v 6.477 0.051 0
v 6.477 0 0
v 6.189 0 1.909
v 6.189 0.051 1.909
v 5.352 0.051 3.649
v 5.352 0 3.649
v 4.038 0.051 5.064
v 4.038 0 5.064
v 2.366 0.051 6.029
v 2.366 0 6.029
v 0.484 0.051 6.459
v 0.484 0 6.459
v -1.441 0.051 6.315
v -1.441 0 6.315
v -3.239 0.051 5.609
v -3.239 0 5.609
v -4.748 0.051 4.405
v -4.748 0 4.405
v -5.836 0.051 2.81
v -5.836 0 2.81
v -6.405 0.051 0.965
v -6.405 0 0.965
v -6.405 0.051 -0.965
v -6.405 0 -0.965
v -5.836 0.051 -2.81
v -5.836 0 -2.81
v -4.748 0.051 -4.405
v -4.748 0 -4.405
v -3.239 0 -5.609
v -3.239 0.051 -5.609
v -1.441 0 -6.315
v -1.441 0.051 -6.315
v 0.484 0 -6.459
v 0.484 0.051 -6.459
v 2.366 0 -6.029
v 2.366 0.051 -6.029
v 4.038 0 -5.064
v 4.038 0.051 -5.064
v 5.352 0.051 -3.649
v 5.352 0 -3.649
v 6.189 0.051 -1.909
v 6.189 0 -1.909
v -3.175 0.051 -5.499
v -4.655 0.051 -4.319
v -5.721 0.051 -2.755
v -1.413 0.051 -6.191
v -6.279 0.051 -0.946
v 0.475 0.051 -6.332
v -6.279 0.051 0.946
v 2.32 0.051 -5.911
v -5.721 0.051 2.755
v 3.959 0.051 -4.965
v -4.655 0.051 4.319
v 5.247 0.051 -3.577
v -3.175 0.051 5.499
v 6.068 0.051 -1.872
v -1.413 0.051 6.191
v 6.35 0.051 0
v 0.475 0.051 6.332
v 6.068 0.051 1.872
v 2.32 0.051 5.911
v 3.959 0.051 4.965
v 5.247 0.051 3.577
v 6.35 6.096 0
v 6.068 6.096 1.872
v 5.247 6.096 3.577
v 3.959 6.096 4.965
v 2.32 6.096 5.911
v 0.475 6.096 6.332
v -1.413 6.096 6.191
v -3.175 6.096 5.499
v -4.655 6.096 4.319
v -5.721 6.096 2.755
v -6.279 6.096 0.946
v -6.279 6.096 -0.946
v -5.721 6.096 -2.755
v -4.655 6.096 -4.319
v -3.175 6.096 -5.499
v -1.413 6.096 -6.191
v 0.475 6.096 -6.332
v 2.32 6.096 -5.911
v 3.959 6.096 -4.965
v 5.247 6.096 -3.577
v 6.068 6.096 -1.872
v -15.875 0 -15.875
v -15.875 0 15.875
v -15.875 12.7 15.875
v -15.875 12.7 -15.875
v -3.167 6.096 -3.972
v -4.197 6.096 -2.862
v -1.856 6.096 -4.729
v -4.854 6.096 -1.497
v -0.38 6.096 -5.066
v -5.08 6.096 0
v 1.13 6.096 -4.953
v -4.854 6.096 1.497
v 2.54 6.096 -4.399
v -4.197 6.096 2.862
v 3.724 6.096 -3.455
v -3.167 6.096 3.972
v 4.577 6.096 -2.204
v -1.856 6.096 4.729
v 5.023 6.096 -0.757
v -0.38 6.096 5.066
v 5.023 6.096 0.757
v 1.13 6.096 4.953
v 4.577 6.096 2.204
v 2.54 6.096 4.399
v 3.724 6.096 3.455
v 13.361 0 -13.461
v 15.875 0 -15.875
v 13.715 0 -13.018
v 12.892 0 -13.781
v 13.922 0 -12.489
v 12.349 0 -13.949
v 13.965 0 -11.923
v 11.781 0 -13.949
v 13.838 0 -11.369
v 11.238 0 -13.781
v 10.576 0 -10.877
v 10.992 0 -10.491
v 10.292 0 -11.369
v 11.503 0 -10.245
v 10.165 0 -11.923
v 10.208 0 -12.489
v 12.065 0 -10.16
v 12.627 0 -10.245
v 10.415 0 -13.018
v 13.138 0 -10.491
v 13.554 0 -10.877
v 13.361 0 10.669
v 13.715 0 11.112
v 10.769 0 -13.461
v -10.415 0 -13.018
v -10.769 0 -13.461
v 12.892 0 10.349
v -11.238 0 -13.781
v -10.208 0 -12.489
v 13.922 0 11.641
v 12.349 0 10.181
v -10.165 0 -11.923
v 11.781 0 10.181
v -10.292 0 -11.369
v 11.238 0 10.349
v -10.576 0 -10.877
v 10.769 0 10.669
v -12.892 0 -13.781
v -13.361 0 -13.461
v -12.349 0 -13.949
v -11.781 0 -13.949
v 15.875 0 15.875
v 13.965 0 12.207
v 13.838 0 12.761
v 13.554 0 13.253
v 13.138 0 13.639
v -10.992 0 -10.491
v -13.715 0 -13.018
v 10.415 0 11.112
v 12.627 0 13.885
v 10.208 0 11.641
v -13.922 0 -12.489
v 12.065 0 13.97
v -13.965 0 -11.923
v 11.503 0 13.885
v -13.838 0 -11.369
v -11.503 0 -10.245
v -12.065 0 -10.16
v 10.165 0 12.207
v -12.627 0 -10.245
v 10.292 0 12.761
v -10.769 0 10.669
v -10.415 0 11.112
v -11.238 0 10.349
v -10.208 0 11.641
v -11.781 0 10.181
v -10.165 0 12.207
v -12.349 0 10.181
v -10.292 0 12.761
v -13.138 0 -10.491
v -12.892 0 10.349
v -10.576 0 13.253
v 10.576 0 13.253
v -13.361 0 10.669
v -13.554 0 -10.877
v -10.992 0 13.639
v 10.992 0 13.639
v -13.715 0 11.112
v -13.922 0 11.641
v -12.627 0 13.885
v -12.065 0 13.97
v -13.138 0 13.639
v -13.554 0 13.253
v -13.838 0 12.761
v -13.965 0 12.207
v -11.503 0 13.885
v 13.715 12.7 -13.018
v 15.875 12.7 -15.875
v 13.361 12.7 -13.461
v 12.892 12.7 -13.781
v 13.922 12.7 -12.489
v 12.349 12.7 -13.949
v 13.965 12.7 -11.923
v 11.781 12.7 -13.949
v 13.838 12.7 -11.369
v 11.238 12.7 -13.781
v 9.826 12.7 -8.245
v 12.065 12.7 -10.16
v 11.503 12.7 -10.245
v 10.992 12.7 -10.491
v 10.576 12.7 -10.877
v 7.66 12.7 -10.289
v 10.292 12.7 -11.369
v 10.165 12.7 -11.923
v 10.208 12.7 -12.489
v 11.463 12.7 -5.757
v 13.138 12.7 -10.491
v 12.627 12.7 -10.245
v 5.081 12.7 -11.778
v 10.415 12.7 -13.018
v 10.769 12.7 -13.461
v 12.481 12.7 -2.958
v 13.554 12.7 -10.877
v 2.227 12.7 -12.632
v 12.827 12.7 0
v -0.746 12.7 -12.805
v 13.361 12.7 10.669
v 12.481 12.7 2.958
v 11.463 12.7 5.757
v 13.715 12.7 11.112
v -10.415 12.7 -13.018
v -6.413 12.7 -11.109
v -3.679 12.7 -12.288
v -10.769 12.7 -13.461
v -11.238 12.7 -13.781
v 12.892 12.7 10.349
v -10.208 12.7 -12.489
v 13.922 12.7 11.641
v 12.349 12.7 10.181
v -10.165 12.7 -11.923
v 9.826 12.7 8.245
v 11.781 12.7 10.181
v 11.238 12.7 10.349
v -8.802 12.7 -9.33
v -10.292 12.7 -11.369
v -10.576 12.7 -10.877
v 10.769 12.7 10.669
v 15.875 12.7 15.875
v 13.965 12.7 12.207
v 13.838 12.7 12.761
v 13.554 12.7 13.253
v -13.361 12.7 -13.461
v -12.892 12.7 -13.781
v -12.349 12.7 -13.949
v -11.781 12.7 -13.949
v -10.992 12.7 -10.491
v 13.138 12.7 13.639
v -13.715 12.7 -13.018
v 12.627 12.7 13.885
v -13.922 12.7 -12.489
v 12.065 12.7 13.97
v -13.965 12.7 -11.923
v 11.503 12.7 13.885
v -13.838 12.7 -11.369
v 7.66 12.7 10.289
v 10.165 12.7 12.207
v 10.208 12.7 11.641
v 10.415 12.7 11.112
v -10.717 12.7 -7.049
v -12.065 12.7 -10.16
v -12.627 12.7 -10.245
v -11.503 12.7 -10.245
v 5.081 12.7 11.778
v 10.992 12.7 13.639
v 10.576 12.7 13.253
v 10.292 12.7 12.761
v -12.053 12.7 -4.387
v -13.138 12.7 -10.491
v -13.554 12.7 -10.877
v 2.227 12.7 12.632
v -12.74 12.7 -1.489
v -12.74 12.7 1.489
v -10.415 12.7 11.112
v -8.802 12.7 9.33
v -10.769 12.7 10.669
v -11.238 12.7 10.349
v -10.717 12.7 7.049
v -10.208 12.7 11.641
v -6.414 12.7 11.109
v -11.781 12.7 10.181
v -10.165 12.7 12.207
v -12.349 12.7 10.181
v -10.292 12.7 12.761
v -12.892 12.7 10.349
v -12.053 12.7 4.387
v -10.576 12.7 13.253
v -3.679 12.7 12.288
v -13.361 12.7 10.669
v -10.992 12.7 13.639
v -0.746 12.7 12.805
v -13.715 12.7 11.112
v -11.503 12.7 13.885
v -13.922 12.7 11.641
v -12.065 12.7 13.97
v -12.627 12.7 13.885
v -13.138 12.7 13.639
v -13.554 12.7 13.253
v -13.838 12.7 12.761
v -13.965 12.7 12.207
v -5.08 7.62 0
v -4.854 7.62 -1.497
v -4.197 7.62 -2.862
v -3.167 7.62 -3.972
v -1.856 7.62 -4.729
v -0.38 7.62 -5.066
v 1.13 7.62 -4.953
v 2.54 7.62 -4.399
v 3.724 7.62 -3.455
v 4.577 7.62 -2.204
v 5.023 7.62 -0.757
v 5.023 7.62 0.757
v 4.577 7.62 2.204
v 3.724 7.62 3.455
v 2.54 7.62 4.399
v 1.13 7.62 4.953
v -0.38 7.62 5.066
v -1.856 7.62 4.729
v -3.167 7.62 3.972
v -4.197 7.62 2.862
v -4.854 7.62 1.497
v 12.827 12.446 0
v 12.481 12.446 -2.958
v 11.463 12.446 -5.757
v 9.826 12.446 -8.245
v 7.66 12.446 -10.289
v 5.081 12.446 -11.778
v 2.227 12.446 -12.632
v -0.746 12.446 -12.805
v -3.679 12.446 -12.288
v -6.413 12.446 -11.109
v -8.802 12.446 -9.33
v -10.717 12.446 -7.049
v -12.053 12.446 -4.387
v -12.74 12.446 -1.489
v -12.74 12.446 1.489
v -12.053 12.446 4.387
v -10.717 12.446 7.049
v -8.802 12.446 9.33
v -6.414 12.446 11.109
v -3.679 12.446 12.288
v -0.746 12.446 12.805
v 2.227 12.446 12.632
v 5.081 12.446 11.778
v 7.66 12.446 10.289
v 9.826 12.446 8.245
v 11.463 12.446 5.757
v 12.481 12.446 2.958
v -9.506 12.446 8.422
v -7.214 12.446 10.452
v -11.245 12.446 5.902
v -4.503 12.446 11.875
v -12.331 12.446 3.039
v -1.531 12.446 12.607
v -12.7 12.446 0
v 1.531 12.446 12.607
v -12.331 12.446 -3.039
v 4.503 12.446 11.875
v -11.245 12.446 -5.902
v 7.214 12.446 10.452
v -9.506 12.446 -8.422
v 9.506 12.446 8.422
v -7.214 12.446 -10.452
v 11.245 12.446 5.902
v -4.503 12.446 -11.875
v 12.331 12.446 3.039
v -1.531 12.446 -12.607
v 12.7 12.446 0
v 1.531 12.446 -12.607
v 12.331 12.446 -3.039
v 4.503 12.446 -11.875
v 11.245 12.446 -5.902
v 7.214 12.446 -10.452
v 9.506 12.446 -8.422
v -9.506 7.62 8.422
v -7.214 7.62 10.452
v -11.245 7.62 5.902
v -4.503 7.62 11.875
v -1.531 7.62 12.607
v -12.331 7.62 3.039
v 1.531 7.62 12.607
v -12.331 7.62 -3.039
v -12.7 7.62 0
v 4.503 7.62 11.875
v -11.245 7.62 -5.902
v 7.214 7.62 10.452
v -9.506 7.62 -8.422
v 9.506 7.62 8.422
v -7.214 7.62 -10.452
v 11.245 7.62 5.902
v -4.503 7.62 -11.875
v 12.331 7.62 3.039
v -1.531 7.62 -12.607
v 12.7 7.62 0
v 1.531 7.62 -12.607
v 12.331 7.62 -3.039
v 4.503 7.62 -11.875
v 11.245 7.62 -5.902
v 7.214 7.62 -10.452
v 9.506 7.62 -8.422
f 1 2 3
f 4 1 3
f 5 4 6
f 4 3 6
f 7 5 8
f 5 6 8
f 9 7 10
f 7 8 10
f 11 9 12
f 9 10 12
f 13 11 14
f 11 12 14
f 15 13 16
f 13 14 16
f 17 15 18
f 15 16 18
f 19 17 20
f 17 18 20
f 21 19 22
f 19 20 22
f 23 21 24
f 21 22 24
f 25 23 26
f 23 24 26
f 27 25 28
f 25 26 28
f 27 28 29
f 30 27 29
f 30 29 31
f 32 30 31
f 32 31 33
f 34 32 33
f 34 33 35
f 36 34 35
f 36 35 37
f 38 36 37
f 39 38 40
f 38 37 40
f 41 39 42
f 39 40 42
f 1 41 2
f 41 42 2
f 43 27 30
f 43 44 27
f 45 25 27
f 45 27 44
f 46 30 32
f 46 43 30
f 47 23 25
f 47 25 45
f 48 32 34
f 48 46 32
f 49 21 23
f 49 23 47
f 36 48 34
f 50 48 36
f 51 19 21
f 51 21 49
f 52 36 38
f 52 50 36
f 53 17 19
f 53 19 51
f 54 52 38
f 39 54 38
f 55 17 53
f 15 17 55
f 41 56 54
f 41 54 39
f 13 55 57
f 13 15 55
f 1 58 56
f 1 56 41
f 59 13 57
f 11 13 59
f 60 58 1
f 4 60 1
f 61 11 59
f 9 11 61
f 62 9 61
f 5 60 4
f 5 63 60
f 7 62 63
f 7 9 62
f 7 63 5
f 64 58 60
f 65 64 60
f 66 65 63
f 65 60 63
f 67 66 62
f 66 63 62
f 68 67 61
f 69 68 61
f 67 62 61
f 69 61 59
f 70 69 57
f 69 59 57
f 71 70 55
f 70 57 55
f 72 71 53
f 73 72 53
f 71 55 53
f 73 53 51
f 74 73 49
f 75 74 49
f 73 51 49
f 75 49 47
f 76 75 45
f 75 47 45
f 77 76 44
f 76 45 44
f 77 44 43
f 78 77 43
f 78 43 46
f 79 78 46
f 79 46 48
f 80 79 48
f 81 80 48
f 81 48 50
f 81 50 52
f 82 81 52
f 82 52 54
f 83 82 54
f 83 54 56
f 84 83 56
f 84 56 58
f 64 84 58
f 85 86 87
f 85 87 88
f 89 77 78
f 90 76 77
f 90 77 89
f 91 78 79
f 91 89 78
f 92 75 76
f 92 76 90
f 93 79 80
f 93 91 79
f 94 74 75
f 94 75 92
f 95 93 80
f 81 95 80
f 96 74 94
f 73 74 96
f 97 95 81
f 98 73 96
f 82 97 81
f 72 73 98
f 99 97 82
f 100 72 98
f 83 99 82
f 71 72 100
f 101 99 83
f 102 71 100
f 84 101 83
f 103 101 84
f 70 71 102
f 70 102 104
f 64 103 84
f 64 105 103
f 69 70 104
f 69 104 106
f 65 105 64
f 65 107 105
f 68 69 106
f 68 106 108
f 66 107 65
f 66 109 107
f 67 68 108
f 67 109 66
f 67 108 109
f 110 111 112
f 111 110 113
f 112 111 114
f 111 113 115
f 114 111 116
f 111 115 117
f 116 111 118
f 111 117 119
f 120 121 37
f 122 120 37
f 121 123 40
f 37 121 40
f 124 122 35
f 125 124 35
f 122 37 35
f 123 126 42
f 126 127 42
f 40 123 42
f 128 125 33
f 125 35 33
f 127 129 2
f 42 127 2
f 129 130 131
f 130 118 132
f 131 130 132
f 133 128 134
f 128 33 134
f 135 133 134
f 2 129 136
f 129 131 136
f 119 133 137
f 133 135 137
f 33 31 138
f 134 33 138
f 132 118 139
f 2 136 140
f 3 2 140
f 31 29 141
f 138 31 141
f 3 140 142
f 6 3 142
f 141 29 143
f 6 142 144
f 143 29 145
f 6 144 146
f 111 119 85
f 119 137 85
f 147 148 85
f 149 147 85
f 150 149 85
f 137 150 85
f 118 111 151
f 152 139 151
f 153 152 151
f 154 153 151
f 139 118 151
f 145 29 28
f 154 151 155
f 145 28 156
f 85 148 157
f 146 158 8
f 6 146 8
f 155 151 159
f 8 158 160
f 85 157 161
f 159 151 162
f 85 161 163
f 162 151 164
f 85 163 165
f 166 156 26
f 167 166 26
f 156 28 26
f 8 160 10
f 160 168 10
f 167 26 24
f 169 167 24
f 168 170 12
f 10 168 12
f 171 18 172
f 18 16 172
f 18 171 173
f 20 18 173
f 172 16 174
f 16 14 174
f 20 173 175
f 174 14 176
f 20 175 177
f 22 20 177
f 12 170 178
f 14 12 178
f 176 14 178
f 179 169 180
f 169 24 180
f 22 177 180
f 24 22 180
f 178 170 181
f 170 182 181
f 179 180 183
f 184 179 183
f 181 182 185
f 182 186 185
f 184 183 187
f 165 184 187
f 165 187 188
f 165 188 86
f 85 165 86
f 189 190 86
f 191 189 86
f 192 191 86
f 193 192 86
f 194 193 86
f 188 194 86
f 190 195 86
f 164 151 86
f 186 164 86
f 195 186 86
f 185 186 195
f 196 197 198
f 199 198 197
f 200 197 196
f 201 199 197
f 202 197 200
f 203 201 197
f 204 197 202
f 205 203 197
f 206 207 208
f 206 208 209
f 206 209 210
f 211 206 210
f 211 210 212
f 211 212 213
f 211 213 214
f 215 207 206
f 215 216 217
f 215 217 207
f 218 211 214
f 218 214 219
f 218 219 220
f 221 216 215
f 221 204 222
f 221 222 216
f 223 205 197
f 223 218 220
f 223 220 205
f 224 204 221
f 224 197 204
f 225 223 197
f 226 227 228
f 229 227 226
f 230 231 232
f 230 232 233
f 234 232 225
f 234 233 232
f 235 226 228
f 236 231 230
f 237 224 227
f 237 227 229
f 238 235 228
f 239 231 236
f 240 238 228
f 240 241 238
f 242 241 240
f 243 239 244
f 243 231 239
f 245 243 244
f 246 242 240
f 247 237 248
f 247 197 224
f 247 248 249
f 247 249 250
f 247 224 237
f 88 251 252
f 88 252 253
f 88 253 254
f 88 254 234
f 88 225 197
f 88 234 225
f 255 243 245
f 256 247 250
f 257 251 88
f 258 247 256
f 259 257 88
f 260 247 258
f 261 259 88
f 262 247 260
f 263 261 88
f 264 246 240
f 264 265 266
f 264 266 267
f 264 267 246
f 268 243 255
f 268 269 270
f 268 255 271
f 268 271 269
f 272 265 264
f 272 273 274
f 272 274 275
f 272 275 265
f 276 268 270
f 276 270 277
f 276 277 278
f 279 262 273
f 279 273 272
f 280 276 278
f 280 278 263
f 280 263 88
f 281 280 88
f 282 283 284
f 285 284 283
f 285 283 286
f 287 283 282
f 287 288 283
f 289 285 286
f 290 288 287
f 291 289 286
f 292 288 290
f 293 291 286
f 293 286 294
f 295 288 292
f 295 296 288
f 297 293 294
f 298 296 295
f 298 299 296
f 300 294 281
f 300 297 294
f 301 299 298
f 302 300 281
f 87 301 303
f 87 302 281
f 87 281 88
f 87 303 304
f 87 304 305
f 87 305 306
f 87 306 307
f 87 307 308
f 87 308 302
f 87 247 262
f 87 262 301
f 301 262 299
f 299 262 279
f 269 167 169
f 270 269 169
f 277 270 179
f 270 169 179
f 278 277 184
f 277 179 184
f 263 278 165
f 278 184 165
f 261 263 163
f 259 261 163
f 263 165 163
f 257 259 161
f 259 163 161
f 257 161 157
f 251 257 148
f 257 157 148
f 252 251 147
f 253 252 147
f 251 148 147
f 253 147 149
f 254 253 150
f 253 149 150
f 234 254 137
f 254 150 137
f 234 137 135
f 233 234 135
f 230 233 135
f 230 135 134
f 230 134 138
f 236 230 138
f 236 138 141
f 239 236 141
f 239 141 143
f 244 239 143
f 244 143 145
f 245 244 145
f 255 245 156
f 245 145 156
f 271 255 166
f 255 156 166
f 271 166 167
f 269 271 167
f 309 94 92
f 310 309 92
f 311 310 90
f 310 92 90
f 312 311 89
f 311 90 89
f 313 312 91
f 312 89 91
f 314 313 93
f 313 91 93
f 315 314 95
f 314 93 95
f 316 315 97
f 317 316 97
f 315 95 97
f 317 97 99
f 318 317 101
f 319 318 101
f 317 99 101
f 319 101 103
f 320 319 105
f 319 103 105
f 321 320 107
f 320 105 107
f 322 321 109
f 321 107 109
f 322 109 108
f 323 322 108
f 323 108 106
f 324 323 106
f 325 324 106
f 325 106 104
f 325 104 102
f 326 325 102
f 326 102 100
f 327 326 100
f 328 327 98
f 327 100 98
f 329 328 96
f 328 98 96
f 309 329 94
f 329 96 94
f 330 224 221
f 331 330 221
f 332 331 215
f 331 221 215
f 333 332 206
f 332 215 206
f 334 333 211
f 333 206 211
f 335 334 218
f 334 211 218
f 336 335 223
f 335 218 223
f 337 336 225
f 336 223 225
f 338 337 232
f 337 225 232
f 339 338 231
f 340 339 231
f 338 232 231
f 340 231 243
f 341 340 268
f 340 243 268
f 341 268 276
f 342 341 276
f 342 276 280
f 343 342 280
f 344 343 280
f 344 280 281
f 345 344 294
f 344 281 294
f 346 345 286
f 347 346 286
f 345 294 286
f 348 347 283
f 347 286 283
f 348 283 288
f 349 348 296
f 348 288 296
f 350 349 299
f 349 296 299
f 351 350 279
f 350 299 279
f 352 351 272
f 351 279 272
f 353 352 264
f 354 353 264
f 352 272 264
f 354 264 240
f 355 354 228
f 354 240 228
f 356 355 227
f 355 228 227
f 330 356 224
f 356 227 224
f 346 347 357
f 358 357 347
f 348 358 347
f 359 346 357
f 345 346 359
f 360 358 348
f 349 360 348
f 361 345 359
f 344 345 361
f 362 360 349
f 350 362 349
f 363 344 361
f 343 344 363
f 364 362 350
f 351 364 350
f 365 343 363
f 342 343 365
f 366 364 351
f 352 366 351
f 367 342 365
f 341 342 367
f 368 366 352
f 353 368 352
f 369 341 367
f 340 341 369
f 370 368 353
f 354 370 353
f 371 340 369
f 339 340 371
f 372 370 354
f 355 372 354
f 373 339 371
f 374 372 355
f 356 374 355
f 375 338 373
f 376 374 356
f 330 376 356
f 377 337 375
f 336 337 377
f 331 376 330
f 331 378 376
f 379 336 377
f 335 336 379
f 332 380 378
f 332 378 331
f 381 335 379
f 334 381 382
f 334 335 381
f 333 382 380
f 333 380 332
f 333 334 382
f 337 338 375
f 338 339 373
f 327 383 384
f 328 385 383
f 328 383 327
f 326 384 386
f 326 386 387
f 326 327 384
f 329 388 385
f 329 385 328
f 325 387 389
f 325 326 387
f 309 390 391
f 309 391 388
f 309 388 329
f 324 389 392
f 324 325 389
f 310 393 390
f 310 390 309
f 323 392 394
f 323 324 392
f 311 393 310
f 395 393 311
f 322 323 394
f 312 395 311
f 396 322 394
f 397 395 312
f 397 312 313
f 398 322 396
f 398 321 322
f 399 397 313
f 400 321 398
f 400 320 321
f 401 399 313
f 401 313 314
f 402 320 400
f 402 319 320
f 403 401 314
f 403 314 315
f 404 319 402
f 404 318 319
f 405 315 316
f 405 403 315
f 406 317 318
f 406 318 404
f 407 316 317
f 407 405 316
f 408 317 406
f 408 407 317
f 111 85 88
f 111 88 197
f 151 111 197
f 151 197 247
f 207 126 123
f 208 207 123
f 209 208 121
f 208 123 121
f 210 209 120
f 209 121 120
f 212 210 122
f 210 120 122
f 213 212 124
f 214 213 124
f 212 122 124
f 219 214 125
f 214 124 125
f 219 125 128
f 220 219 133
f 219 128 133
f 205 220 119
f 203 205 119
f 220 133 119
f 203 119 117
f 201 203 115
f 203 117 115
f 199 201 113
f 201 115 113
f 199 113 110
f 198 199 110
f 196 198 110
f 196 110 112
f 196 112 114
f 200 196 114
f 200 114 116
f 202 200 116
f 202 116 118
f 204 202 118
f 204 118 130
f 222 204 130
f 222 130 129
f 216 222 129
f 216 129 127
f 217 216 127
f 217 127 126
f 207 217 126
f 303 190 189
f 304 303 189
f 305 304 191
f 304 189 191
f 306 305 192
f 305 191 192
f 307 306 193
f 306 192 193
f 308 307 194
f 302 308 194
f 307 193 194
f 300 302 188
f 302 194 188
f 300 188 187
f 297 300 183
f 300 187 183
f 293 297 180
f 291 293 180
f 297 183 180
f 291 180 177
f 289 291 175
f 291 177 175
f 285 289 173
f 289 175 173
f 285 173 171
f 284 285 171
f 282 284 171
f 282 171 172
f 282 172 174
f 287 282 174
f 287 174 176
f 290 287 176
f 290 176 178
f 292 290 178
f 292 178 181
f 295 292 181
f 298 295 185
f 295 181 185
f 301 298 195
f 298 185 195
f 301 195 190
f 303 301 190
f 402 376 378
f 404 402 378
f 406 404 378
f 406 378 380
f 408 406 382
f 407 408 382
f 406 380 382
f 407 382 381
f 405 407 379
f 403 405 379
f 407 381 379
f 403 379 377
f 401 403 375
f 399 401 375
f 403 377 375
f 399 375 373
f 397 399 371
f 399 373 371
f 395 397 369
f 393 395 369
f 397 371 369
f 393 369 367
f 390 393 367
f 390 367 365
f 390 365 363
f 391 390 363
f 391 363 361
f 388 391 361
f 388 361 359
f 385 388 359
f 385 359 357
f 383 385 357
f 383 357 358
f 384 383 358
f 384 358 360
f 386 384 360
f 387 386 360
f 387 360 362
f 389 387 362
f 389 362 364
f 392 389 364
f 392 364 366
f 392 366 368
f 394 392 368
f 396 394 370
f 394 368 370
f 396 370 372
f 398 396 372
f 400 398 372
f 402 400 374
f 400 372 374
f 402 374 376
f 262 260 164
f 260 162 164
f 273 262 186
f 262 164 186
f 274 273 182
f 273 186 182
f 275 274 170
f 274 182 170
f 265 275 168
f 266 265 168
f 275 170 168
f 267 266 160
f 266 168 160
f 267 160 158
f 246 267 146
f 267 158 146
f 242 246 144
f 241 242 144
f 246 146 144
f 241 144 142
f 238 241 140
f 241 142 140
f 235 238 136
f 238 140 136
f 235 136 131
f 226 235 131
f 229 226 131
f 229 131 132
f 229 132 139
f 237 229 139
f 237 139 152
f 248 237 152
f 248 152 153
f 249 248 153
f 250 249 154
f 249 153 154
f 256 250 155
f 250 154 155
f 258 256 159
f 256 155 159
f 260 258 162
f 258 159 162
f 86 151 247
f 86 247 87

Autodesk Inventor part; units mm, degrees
ref_plane "YZ Plane" through (0, 0, 0) normal (1, 0, 0) x (0, 1, 0)
ref_plane "XZ Plane" through (0, 0, 0) normal (0, 1, 0) x (-1, 0, 0)
ref_plane "XY Plane" through (0, 0, 0) normal (0, 0, 1) x (1, 0, 0)
sketch "Sketch1" plane through (0, 0, 0) normal (0, 1, 0) x (-1, 0, 0)
  circle A0 centre (0, 0) radius 5.08
  line L0 (-15.875, 15.875) -> (15.875, 15.875)
  line L1 (15.875, 15.875) -> (15.875, -15.875)
  line L2 (15.875, -15.875) -> (-15.875, -15.875)
  line L3 (-15.875, -15.875) -> (-15.875, 15.875)
  line L4 (-15.875, 15.875) -> (15.875, -15.875) construction
  line L5 (15.875, 15.875) -> (-15.875, -15.875) construction
  dimension "d0" = 10.16
  dimension "d1" = 31.75
  dimension "d2" = 31.75
extrude "Extrusion1" add sketch "Sketch1" along normal blind 12.7
sketch "Sketch2" plane through (0, 12.7, 0) normal (0, 1, 0) x (1, 0, 0)
  circle A0 centre (0, 0) radius 12.7
  dimension "d5" = 25.4
extrude "Extrusion2" cut sketch "Sketch2" against normal blind 5.08
sketch "Sketch3" plane through (0, 12.7, 0) normal (0, 1, 0) x (1, 0, 0)
  line L0 (-12.065, 12.065) -> (12.065, 12.065) construction
  line L1 (12.065, 12.065) -> (12.065, -12.065) construction
  line L2 (12.065, -12.065) -> (-12.065, -12.065) construction
  line L3 (-12.065, -12.065) -> (-12.065, 12.065) construction
  line L4 (-12.065, 12.065) -> (12.065, -12.065) construction
  line L5 (12.065, 12.065) -> (-12.065, -12.065) construction
  line L6 (15.875, -15.875) -> (15.875, 15.875) projected
  line L7 (-15.875, -15.875) -> (15.875, -15.875) projected
  point P0 (0, 0)
  dimension "d8" = 3.81
  dimension "d9" = 3.81
hole "Hole1" at (12.065, 12.7, 12.065) at (-12.065, 12.7, 12.065) at (-12.065, 12.7, -12.065) at (12.065, 12.7, -12.065) direction (0, -1, 0) diameter 3.81 end through all clearance for "Flat Head Machine Screw (82)" size "#6" standard "Ansi Unified Screw Threads"
sketch "Sketch4" plane through (0, 12.7, 0) normal (0, 1, 0) x (1, 0, 0)
  circle A0 centre (0, 0) radius 12.827
  dimension "d17" = 25.654
extrude "Extrusion3" cut sketch "Sketch4" against normal blind 0.254
sketch "Sketch5" plane through (0, 0, 0) normal (0, -1, 0) x (1, 0, 0)
  circle A0 centre (0, 0) radius 6.477
  dimension "d20" = 12.954
extrude "Extrusion4" cut sketch "Sketch5" against normal blind 0.0508
sketch "Sketch6" plane through (0, 0, 0) normal (0, -1, 0) x (1, 0, 0)
  circle A0 centre (0, 0) radius 6.35
  dimension "d23" = 12.7
extrude "Extrusion5" cut sketch "Sketch6" against normal blind 6.096
properties part number "silverSolderJoint" material "Copper"
